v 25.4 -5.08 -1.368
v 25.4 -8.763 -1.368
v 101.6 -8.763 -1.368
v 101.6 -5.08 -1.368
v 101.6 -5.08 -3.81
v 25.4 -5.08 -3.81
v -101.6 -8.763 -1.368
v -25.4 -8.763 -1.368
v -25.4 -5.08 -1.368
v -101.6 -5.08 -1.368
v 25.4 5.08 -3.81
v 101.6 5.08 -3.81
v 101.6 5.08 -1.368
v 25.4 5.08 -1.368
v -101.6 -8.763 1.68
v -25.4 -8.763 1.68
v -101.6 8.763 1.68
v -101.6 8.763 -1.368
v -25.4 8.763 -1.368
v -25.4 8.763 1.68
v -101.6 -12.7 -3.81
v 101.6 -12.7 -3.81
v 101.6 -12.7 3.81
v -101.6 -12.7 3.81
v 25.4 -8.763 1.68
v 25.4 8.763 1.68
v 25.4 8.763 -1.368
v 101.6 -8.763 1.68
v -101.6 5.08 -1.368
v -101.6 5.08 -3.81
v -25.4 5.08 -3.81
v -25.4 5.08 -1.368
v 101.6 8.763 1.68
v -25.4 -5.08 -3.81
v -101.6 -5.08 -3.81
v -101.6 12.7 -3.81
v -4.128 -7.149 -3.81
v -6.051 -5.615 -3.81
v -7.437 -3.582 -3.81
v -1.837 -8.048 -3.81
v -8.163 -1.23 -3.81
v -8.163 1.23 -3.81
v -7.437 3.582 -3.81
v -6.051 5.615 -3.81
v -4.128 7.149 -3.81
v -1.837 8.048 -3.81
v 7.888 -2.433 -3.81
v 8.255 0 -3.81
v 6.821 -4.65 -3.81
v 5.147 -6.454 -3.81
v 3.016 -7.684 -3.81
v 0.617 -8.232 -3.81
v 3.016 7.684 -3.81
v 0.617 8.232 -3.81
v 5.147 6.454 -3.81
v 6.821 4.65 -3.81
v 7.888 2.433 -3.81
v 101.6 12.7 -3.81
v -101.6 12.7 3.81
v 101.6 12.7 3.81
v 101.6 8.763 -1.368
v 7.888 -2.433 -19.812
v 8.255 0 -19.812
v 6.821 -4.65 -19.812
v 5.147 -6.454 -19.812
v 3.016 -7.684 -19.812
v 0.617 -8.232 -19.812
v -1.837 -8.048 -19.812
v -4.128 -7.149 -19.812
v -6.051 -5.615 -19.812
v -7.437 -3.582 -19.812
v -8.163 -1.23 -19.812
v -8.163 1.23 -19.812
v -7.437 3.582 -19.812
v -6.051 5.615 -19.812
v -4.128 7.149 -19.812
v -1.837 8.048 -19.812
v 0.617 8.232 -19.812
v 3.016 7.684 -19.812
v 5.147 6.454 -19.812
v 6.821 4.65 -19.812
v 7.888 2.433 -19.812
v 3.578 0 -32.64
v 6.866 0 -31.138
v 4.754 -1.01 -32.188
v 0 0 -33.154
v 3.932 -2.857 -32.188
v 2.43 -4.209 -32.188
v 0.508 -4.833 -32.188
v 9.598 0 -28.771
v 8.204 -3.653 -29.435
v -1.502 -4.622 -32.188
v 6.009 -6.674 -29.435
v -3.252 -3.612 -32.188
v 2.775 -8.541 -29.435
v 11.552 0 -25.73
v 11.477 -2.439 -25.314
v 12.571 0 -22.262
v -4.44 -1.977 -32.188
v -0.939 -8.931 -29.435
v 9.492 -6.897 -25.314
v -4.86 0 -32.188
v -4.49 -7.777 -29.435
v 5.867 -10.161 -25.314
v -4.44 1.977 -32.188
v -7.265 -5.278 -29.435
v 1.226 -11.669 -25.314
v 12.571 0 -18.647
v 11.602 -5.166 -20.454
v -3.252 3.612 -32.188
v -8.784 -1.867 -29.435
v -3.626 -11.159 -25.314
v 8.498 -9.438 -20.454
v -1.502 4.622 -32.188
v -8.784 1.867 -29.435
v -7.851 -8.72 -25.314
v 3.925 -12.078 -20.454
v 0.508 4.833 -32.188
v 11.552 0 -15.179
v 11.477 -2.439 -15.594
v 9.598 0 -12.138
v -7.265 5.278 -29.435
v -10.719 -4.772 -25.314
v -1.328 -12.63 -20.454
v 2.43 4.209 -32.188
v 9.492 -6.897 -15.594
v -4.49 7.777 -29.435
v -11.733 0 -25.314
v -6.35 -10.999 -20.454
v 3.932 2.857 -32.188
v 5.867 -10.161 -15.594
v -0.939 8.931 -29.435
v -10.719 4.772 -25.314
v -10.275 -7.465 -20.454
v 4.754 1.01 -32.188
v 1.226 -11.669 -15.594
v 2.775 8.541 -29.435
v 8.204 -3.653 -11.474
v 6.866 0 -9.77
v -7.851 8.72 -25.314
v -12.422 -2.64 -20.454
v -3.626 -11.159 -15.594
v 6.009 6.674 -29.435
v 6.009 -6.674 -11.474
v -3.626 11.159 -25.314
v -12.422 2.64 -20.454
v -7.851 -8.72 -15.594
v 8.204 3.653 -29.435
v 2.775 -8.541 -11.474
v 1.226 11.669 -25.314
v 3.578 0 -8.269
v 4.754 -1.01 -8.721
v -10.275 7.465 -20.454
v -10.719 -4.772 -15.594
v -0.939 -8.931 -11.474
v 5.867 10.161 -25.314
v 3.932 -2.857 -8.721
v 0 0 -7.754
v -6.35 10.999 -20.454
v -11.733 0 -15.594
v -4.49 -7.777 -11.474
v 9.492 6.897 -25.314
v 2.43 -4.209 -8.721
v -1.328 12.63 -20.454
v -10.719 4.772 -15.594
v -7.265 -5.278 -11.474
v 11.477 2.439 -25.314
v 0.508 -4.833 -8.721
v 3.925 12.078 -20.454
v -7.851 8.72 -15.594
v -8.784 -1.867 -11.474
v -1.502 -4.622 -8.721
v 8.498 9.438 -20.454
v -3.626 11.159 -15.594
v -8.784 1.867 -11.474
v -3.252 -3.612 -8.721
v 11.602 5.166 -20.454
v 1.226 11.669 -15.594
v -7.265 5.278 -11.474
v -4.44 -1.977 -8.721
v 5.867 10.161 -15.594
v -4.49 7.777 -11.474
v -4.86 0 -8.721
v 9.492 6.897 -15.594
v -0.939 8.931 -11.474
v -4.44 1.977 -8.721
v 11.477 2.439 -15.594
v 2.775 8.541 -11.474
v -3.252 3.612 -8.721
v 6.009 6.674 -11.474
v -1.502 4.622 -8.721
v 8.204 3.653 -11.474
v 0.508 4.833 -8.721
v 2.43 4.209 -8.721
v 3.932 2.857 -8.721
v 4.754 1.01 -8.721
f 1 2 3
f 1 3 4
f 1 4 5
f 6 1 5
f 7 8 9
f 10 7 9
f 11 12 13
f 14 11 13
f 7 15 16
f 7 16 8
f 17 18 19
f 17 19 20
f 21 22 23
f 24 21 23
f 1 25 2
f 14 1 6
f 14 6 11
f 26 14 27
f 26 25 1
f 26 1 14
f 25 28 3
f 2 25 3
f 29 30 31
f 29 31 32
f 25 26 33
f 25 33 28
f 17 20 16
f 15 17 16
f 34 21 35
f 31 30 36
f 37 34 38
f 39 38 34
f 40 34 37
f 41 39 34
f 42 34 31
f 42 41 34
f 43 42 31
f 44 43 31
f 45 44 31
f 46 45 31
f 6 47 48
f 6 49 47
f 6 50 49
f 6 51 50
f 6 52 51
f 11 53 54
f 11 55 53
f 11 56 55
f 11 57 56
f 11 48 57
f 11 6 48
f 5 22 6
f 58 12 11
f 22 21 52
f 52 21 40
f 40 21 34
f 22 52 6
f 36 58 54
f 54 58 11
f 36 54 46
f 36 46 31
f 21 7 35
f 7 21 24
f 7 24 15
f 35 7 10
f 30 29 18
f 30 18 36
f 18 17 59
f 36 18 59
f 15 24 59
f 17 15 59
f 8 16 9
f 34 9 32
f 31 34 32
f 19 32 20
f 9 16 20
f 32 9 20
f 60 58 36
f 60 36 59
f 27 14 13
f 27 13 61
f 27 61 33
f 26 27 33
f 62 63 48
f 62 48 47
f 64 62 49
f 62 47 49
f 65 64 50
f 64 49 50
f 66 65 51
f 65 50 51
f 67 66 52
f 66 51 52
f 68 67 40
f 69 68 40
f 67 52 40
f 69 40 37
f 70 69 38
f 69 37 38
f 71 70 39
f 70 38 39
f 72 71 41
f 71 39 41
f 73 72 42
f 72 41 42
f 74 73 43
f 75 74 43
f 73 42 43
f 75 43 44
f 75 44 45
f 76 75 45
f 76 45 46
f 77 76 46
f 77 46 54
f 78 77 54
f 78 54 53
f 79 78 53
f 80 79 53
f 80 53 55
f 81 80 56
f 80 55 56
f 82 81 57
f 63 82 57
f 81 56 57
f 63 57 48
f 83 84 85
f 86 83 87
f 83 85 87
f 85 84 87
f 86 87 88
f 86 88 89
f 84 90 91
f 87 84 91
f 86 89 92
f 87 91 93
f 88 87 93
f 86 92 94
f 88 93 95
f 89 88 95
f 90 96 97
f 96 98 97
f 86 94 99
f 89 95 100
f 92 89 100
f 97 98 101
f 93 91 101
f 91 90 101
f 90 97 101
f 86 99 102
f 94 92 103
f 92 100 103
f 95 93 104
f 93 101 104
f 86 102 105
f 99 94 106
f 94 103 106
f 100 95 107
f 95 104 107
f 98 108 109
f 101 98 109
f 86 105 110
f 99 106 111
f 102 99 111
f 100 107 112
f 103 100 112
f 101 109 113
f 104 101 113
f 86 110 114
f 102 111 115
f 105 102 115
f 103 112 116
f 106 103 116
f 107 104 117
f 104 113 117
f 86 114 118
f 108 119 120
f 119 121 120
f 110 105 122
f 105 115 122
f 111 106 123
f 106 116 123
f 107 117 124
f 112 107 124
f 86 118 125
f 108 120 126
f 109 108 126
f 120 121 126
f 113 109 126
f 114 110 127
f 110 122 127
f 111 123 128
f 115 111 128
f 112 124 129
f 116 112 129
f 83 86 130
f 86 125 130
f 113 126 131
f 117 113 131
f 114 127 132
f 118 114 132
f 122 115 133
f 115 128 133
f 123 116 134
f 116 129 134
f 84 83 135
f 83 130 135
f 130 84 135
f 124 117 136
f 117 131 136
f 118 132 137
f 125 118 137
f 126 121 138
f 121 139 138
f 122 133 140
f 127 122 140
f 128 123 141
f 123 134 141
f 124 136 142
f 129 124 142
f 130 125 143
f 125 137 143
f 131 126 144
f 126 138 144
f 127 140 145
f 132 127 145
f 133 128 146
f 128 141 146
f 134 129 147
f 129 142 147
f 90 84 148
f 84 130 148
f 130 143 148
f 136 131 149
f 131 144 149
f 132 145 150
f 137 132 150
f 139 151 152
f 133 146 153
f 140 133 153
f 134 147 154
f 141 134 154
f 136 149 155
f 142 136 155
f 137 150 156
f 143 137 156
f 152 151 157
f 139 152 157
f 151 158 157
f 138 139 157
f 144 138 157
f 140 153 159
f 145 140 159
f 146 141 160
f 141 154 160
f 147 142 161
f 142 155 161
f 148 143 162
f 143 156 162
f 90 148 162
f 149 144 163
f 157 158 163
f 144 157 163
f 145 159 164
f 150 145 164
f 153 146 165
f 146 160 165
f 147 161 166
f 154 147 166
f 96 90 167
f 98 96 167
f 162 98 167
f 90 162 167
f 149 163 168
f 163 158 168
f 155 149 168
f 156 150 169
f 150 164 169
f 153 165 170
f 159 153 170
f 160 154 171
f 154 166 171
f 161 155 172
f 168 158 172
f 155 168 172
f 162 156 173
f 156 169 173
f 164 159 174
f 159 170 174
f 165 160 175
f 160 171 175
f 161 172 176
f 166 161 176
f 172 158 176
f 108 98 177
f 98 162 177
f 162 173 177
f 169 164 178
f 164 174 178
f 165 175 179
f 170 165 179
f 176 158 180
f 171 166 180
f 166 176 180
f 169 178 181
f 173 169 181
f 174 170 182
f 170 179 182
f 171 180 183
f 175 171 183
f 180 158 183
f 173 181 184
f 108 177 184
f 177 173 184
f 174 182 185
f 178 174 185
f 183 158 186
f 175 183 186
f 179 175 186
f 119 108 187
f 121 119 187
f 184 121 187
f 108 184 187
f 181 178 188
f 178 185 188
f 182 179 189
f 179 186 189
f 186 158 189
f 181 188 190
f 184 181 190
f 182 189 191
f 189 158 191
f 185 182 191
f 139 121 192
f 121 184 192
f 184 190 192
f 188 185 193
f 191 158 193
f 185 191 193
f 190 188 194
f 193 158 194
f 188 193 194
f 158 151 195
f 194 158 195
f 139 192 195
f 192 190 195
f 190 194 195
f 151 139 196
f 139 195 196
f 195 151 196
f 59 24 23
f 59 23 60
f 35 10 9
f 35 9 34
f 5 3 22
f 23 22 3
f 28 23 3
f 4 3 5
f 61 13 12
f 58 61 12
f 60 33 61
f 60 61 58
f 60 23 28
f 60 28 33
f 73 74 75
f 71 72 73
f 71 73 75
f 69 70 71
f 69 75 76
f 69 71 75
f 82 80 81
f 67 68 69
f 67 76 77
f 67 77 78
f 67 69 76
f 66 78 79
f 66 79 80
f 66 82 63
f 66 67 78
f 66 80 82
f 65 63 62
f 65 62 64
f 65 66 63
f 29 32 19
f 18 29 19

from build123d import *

# Parameters (mm, degrees)
F0_W     = 25.4
F0_H     = 7.62
F1_DEPTH = 101.6
F3_START = -25.4
F3_DEPTH = 93.726
F4_START = 25.4
F4_DEPTH = 101.6
F5_R     = 8.255
F6_DEPTH = 16.002


with BuildPart() as f1:
    # F0 (on Right) → F1 (new body, symmetric)
    with BuildSketch(Plane.YZ):
        Rectangle(F0_W, F0_H)
    extrude(amount=F1_DEPTH, both=True)

    # F2 (on Right) → F3 (cut)
    with BuildSketch(Plane.YZ.offset(F3_START)):
        Polygon((8.763, 1.6796102394), (-8.763, 1.6796102394), (-8.763, -1.3683897606), (-5.08, -1.3683897606), (-5.08, -3.827353653), (5.08, -3.827353653), (5.08, -1.3683897606), (8.763, -1.3683897606), align=None)
    extrude(amount=-F3_DEPTH, mode=Mode.SUBTRACT)

    # F2 (on Right) → F4 (cut)
    with BuildSketch(Plane.YZ.offset(F4_START)):
        Polygon((8.763, 1.6796102394), (-8.763, 1.6796102394), (-8.763, -1.3683897606), (-5.08, -1.3683897606), (-5.08, -3.827353653), (5.08, -3.827353653), (5.08, -1.3683897606), (8.763, -1.3683897606), align=None)
    extrude(amount=F4_DEPTH, mode=Mode.SUBTRACT)

    # F5 (on face) → F6 (join)
    with BuildSketch(Plane(origin=(0, 0, -3.81), x_dir=(1, 0, 0), z_dir=(0, 0, -1))):
        Circle(F5_R)
    extrude(amount=F6_DEPTH)


with BuildPart() as f8:
    # F7 (on Front) → F8 (revolve)
    with BuildSketch(Plane.XZ):
        with BuildLine():
            Line((0, -20.4544011503), (0, -33.1544011503))
            ThreePointArc((0, -33.1544011503), (12.7, -20.4544011503), (0, -7.7544011503))
            Line((0, -7.7544011503), (0, -20.4544011503))
        make_face()
    revolve(axis=Axis((0, 0, -26.8044011503), (0, 0, -1)))


solid = Compound([f1.part, f8.part])
